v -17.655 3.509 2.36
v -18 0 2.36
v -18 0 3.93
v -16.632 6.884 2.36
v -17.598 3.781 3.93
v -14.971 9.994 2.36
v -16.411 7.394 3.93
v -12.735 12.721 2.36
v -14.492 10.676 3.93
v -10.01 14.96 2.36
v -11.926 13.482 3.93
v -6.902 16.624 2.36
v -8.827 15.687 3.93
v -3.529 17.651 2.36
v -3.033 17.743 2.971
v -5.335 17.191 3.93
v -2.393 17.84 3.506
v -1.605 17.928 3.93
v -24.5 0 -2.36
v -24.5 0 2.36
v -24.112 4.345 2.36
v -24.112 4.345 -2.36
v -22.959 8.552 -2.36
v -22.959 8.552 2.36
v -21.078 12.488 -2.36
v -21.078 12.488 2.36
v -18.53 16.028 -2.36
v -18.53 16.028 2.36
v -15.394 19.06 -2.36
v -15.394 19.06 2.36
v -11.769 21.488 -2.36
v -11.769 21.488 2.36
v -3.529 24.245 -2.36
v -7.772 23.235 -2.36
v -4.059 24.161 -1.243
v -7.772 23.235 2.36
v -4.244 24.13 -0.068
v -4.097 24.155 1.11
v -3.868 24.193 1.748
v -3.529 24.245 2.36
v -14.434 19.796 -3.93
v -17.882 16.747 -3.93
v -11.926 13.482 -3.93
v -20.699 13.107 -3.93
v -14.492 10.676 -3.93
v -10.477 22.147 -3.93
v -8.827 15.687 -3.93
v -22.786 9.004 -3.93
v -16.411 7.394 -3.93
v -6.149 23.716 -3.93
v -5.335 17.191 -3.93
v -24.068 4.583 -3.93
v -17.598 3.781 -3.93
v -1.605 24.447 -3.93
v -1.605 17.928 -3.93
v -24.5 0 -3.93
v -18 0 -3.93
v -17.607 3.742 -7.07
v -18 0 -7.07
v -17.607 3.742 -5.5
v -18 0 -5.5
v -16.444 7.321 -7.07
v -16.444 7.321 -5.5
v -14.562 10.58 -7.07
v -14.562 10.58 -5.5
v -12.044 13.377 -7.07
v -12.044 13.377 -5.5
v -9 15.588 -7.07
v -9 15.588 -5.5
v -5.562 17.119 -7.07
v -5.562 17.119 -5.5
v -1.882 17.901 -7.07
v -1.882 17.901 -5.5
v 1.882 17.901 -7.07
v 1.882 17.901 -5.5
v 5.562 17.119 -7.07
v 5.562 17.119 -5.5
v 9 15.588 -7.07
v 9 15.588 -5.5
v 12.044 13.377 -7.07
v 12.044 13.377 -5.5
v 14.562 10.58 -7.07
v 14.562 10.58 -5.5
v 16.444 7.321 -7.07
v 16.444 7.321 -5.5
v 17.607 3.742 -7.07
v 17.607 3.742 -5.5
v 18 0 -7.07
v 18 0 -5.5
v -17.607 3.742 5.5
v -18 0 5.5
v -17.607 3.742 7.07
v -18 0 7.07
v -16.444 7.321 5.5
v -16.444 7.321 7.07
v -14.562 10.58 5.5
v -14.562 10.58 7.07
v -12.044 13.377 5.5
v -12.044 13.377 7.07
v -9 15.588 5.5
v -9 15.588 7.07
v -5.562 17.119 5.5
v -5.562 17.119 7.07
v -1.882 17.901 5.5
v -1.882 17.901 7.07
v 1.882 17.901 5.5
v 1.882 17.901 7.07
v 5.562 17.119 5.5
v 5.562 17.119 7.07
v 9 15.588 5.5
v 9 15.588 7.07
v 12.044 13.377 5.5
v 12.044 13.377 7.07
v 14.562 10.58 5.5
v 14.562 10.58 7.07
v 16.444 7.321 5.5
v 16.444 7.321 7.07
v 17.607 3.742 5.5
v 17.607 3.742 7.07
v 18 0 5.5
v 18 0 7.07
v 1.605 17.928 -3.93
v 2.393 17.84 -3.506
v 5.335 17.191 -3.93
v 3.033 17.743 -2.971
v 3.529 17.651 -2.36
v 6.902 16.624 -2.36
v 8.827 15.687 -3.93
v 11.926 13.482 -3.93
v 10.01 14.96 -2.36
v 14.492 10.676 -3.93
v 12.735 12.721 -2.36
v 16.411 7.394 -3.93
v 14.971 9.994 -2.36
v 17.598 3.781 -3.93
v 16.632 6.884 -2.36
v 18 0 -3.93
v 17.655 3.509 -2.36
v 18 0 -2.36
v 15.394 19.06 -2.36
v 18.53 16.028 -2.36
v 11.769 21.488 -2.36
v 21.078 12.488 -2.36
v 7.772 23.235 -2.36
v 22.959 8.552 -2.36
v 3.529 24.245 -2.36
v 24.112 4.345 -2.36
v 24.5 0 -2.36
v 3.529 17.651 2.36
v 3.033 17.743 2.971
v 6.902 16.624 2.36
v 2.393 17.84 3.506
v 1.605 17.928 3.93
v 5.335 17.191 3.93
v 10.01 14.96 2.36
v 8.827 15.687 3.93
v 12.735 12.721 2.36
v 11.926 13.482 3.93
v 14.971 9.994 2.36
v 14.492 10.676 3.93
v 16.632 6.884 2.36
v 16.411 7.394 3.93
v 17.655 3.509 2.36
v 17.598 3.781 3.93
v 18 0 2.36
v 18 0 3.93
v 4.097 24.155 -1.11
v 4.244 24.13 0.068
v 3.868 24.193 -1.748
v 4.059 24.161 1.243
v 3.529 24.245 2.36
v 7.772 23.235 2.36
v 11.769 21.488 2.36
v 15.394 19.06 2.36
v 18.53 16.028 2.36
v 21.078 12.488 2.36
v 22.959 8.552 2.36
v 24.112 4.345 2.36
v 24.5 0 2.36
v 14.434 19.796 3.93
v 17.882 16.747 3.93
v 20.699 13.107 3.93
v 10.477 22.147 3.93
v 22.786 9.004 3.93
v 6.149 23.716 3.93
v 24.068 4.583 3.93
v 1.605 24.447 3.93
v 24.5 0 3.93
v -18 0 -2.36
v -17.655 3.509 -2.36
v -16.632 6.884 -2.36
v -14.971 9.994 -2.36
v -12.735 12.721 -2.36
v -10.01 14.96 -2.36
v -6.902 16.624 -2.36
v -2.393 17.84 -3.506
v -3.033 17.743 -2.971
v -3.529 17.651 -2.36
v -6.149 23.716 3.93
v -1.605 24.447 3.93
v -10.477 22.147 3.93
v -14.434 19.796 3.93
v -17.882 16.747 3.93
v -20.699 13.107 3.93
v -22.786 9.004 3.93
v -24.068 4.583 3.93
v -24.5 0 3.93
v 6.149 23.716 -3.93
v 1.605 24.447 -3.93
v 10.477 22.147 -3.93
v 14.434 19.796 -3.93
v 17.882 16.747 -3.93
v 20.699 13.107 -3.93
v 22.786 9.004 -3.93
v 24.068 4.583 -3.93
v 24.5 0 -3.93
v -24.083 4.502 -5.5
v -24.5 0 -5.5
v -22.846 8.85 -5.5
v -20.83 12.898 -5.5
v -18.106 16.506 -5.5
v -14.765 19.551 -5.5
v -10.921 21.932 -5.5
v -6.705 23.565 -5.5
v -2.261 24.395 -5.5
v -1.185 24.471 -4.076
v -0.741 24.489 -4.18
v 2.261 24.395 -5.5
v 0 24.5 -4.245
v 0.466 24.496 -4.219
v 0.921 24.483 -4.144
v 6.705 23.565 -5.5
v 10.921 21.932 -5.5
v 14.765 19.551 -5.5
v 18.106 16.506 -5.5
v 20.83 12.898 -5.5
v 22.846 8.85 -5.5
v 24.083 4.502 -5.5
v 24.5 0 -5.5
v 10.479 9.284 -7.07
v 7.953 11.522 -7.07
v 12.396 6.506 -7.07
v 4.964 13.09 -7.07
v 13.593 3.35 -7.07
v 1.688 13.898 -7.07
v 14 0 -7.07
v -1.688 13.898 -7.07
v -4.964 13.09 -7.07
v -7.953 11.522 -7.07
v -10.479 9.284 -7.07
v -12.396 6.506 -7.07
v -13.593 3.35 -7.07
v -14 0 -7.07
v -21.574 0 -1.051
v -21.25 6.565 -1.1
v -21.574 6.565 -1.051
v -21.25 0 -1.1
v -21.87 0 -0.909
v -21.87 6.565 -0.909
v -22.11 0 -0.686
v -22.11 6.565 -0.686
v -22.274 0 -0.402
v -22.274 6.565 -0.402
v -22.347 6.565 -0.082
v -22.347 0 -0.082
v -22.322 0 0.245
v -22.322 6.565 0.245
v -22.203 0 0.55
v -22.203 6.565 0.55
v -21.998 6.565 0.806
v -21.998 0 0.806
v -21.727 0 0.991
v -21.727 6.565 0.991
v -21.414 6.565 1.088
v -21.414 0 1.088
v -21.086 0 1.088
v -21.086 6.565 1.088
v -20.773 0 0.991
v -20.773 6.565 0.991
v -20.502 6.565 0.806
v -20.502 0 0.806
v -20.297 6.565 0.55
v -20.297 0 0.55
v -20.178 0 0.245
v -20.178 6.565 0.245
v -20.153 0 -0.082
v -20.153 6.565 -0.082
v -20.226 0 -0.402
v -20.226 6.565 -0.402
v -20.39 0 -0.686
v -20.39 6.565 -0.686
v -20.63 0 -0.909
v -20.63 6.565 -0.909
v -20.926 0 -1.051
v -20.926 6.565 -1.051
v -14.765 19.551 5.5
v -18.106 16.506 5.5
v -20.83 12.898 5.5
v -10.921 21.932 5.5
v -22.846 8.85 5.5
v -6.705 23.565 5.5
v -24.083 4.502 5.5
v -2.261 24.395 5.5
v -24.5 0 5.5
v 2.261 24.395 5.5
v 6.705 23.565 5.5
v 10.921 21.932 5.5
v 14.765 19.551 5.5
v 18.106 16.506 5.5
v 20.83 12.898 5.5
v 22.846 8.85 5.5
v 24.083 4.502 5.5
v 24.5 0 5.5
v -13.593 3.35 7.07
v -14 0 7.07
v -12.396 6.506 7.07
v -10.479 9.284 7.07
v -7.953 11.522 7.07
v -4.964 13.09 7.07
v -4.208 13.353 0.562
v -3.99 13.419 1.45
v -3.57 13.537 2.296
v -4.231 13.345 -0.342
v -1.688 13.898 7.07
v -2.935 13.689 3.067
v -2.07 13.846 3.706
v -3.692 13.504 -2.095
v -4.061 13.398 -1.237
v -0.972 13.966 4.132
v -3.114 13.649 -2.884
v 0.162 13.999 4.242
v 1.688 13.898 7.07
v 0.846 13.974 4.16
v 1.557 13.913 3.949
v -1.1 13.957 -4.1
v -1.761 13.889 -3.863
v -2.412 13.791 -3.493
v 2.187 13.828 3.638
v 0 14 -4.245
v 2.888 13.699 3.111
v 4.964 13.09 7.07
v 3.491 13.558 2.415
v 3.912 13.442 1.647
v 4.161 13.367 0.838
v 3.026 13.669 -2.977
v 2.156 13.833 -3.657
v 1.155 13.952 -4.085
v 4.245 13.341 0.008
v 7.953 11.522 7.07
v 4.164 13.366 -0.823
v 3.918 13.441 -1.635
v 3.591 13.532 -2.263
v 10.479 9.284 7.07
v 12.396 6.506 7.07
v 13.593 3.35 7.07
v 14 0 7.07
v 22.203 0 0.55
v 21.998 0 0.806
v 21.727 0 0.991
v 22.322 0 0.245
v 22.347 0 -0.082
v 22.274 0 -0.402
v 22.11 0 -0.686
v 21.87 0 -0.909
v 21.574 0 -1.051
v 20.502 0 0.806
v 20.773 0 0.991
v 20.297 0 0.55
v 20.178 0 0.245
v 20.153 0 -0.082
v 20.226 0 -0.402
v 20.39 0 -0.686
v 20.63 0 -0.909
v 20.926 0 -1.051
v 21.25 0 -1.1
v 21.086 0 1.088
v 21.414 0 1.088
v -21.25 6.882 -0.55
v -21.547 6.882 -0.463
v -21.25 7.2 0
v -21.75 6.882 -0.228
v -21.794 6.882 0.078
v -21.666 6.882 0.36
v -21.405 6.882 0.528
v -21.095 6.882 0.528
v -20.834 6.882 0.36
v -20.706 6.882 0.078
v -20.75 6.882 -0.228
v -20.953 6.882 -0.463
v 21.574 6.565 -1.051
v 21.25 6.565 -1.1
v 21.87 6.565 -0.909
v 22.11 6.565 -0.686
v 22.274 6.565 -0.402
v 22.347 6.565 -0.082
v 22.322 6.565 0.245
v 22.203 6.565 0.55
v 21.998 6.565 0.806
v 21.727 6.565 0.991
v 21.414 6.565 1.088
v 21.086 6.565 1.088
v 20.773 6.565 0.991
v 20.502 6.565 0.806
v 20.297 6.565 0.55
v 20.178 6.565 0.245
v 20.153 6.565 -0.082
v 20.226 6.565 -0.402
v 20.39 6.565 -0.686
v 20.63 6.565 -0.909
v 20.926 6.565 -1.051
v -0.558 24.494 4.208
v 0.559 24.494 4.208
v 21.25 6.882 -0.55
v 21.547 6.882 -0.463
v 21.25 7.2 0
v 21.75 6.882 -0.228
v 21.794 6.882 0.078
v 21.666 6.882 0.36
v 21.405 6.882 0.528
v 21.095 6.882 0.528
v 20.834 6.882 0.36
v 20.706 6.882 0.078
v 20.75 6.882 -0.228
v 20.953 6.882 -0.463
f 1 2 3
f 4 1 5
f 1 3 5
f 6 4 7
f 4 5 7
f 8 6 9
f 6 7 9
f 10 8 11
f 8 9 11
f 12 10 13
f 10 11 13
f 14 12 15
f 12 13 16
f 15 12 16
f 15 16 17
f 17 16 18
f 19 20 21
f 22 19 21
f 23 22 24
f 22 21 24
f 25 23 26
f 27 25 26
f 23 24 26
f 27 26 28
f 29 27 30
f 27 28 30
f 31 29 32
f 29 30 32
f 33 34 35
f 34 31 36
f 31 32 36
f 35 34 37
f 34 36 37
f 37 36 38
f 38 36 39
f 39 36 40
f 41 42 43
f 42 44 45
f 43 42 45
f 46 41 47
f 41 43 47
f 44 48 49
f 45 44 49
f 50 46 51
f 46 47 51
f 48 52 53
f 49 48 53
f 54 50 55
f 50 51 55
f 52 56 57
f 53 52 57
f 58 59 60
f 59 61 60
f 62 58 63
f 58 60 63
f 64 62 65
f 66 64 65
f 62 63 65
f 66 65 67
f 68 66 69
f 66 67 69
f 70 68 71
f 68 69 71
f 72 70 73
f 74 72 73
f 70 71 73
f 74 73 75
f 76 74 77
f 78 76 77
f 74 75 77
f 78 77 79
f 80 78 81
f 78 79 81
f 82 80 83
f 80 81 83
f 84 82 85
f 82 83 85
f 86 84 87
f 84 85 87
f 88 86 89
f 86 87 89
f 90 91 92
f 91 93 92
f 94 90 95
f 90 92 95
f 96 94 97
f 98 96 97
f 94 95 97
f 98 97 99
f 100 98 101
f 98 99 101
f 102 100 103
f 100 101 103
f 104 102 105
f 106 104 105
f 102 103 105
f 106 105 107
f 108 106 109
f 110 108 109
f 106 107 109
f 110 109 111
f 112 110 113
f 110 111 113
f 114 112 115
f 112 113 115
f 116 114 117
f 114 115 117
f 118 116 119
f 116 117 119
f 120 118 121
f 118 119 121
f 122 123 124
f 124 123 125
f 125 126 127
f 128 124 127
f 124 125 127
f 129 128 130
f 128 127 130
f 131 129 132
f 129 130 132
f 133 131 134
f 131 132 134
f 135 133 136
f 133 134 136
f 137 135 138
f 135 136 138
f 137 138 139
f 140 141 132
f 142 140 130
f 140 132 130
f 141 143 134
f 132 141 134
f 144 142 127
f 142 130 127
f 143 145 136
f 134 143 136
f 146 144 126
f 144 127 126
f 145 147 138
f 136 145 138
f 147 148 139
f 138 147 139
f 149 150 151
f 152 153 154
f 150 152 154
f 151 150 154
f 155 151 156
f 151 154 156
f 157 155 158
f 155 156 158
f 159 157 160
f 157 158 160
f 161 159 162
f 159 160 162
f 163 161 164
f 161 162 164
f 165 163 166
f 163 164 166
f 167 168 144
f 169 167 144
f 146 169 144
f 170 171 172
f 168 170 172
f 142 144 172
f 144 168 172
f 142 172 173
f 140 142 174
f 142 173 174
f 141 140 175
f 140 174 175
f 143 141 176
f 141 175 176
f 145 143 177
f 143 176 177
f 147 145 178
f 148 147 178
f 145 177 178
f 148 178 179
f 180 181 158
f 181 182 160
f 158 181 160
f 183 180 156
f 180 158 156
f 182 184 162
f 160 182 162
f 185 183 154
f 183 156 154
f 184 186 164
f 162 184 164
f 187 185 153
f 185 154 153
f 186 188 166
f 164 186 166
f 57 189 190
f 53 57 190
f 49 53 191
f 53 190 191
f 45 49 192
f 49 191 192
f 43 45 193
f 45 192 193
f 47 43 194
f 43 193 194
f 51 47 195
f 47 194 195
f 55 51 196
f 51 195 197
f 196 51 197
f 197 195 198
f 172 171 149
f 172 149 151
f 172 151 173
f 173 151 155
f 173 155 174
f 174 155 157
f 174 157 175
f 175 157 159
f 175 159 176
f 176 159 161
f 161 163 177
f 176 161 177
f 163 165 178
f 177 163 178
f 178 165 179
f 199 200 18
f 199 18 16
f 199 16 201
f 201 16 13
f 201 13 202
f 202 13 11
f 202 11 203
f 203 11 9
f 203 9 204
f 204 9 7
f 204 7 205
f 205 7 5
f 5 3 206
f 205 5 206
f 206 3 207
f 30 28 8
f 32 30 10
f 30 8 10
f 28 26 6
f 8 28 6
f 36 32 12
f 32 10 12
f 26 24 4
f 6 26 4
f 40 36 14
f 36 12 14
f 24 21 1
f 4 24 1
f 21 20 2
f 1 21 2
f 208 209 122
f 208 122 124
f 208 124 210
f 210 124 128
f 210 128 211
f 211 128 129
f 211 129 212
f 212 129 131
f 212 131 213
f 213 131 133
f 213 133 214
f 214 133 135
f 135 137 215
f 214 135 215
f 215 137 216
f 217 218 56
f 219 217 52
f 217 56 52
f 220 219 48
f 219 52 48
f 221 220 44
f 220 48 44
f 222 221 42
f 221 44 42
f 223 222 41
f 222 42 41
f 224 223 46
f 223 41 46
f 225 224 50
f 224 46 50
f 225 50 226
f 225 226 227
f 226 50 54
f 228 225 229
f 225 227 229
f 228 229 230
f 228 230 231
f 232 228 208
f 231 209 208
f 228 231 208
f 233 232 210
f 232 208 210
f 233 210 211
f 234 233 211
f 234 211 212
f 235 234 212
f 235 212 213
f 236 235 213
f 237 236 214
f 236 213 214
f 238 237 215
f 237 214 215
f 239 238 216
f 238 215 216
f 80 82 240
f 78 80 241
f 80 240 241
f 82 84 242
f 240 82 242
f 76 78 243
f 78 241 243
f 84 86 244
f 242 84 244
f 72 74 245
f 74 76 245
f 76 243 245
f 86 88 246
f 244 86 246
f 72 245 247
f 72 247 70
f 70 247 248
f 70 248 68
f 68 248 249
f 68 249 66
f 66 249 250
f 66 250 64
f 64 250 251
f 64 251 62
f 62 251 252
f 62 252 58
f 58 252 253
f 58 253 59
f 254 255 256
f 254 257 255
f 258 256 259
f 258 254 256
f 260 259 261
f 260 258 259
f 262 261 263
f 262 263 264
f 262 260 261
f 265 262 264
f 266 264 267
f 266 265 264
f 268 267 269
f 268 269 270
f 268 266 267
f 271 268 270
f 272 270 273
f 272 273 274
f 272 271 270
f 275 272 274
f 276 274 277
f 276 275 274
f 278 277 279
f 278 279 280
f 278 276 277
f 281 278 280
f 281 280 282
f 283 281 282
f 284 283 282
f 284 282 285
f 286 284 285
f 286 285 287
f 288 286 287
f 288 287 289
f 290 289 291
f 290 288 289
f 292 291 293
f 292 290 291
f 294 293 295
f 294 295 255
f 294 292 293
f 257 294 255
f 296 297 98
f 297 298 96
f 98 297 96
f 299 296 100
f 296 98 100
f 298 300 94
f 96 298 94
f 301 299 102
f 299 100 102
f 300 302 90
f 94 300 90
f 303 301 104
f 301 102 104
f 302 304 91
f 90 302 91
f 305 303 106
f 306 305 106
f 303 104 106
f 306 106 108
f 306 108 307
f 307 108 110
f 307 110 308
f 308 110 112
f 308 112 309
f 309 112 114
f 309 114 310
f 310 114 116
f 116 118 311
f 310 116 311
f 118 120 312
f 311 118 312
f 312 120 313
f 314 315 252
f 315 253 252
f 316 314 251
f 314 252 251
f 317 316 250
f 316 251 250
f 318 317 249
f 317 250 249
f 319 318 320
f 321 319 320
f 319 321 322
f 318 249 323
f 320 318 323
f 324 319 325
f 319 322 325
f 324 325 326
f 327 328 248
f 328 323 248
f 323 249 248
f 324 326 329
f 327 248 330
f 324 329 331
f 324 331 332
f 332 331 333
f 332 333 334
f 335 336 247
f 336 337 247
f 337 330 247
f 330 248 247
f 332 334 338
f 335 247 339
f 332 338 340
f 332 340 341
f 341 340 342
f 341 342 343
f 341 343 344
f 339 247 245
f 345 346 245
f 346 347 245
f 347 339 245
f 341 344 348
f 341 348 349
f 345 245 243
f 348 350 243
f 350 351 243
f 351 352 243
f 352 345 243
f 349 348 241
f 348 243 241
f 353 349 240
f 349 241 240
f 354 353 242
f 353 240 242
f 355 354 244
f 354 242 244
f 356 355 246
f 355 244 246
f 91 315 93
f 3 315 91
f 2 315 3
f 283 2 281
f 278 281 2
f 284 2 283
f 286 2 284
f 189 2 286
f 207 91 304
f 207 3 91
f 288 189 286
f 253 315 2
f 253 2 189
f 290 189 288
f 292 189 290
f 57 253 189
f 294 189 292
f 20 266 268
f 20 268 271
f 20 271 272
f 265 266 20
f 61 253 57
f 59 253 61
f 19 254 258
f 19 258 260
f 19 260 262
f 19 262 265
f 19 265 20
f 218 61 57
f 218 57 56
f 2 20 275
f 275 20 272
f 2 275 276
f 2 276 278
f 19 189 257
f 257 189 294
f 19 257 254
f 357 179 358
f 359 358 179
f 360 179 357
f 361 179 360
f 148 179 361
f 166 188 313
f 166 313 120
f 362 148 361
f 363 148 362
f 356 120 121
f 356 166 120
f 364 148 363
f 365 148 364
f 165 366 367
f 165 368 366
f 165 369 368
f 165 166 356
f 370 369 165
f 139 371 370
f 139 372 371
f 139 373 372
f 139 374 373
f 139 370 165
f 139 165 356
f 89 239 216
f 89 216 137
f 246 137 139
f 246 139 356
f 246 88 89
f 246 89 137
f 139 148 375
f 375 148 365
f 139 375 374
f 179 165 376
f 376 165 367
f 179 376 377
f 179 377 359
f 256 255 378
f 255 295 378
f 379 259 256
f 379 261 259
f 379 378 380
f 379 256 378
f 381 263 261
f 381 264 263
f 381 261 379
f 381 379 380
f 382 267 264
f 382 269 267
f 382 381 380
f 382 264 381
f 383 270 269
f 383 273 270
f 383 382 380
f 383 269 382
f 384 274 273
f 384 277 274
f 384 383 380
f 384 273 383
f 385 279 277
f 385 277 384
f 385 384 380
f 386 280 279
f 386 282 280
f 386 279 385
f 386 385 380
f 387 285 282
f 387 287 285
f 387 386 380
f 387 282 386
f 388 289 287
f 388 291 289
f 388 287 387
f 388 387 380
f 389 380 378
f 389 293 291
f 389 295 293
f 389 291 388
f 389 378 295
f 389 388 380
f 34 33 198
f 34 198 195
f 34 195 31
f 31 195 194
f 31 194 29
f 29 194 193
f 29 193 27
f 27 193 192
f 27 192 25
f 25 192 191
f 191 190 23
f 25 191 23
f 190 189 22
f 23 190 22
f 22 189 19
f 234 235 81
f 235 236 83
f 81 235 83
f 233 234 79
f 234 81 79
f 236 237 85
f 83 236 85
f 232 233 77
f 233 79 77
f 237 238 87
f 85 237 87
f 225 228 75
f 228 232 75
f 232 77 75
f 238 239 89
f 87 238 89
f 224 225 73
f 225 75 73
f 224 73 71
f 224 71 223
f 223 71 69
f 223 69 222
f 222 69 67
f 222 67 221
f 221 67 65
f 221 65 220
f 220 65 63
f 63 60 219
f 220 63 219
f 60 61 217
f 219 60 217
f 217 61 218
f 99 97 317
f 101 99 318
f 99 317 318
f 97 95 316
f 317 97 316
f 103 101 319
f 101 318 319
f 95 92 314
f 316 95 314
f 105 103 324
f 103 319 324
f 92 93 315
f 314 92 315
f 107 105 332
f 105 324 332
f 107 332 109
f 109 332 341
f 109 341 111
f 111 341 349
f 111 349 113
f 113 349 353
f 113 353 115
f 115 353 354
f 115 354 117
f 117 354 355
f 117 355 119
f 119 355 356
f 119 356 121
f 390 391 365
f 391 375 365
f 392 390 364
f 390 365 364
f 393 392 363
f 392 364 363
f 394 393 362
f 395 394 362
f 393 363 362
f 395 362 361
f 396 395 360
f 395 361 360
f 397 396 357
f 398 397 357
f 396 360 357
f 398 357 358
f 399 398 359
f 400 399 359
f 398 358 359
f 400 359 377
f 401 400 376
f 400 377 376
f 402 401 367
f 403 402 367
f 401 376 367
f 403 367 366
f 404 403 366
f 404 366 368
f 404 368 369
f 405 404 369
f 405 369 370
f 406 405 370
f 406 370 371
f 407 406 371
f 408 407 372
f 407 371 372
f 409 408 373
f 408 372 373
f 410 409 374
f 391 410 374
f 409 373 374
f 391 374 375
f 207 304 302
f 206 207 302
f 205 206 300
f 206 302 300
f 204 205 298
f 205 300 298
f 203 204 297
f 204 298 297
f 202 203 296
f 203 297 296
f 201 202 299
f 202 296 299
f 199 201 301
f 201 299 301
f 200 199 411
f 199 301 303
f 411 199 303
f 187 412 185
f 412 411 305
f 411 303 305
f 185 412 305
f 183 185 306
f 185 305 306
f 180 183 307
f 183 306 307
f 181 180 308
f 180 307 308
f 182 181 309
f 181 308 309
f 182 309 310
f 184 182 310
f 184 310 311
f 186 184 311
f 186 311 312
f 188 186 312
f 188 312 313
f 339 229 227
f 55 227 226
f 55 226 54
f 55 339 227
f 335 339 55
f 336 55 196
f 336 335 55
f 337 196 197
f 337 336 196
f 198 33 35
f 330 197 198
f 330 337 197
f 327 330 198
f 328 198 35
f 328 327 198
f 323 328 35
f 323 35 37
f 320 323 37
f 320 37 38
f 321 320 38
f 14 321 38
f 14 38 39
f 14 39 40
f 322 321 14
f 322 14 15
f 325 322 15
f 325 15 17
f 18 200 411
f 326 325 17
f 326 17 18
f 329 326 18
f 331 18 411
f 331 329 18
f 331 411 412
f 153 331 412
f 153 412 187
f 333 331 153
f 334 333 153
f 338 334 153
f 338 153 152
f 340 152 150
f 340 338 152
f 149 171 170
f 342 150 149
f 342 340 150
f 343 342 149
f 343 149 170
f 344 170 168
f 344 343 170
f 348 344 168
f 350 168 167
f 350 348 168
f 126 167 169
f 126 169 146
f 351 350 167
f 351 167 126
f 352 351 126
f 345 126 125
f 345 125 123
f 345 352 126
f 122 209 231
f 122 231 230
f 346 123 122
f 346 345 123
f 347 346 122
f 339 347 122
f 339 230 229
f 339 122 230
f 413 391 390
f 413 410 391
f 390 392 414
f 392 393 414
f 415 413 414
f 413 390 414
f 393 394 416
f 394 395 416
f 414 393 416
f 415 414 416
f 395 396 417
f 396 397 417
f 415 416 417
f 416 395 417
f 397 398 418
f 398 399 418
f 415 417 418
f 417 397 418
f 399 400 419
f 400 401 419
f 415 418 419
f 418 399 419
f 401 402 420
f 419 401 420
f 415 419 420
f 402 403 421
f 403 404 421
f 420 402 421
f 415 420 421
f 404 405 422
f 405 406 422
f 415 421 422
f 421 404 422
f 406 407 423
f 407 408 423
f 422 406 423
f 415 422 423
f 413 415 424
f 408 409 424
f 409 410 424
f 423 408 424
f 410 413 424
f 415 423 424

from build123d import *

# Parameters (mm, degrees)
CUT_EXTRUDE1_DEPTH      = 36.362195916
CUT_EXTRUDE1_DEPTH_BACK = 36.362195916
CUT_EXTRUDE2_DEPTH      = 36.362195916
CUT_EXTRUDE2_DEPTH_BACK = 36.362195916
SKETCH4_R               = 4.245


with BuildPart() as part:
    # Sketch1 → Revolve1 (revolve)
    with BuildSketch(Plane(origin=(0, 0, 0), x_dir=(1, 0, 0), z_dir=(0, 1, 0)), mode=Mode.PRIVATE) as revolve1_sk:
        Polygon((-14, -7.07), (-14, 7.07), (-18, 7.07), (-18, 5.5), (-24.5, 5.5), (-24.5, 3.93), (-18, 3.93), (-18, 2.36), (-24.5, 2.36), (-24.5, -2.36), (-18, -2.36), (-18, -3.93), (-24.5, -3.93), (-24.5, -5.5), (-18, -5.5), (-18, -7.07), align=None)
    revolve(revolve1_sk.sketch.rotate(Axis((0, 0, 0), (0, 0, -1)), 180), axis=Axis((0, 0, 0), (0, 0, -1)))

    # Sketch3 → Cut-Extrude1 (cut, two sides: drawn at the far end of the back side and taken through both)
    with BuildSketch(Plane.XY.offset(-CUT_EXTRUDE1_DEPTH_BACK)):
        with BuildLine():
            Line((-14, 0), (-24.5, 0))
            ThreePointArc((-24.5, 0), (0, -24.5), (24.5, 0))
            Line((24.5, 0), (14, 0))
            ThreePointArc((14, 0), (0, -14), (-14, 0))
        make_face()
    extrude(amount=CUT_EXTRUDE1_DEPTH + CUT_EXTRUDE1_DEPTH_BACK, mode=Mode.SUBTRACT)

    # Sketch4 → Cut-Extrude2 (cut, two sides: drawn at the far end of the back side and taken through both)
    with BuildSketch(Plane(origin=(0, 0, 0), x_dir=(1, 0, 0), z_dir=(0, 1, 0)).offset(-CUT_EXTRUDE2_DEPTH_BACK)):
        with Locations(Location((0, 0, 0), (0, 0, 90))):
            Circle(SKETCH4_R)
    extrude(amount=CUT_EXTRUDE2_DEPTH + CUT_EXTRUDE2_DEPTH_BACK, mode=Mode.SUBTRACT)

    # Sketch6 → Tap Drill for M2x0.4 Tap1 (revolve, cut)
    with BuildSketch(Plane(origin=(-21.25, 0, 0), x_dir=(0, 0, -1), z_dir=(1, 0, 0))):
        Polygon((0, 0), (0, 7.2), (1.1, 6.564914704), (1.1, 0), align=None)
    tap_drill_for_m2x0_4_tap1 = revolve(axis=Axis((-21.25, -6.35, 0), (0, 1, 0)), mode=Mode.SUBTRACT)

    # Mirror1: Tap Drill for M2x0.4 Tap1 across plane
    add(tap_drill_for_m2x0_4_tap1.mirror(Plane(origin=(0, 0, 0), x_dir=(0, 0, 1), z_dir=(1, 0, 0))), mode=Mode.SUBTRACT)


solid = part.part
